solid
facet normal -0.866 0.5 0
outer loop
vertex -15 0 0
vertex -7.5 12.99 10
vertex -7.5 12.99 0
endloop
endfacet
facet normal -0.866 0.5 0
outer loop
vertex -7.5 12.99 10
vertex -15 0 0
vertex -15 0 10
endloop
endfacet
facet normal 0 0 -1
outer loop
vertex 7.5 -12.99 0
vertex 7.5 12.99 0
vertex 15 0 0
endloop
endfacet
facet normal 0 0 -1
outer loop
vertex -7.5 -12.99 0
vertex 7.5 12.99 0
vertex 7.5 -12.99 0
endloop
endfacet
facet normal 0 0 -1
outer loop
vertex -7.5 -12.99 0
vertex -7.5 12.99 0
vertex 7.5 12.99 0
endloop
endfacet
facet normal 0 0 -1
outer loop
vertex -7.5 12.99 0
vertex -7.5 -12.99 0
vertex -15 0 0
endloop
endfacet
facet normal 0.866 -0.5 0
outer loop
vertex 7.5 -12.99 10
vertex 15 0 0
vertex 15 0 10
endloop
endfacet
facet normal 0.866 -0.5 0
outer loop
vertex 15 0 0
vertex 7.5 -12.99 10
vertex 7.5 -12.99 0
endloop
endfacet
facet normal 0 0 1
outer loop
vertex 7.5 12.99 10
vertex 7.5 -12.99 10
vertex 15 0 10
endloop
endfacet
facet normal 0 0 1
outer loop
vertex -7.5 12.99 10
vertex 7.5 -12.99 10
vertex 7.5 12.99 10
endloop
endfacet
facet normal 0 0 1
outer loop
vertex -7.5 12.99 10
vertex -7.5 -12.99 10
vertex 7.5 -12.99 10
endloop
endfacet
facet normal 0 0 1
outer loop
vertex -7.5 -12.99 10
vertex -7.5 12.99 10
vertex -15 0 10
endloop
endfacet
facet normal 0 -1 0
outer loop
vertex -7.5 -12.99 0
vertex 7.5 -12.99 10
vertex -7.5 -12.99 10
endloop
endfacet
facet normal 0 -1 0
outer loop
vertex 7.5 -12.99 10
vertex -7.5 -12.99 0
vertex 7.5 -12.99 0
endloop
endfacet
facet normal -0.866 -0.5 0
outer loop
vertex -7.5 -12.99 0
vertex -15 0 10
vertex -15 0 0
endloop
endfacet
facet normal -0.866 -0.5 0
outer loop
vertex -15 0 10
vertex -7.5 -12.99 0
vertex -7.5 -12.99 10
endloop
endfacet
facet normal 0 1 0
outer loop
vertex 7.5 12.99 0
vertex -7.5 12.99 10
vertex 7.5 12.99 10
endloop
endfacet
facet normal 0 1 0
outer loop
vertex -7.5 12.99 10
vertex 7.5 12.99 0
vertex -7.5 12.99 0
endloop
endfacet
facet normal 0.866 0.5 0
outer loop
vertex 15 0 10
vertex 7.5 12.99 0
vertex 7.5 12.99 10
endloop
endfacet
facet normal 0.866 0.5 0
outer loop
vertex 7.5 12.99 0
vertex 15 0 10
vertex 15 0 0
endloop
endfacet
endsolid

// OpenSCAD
module hexagon() {
    polygon(points=[[15,0],[7.5,12.99],[-7.5,12.99],[-15,0],[-7.5,-12.99],[7.5,-12.99]]);
}

module circle_at_origin(radius) {
    circle(r=radius);
}

difference() {
    linear_extrude(height=10) {
        hexagon();
    }
    translate([0, 0, -1]) {
        circle_at_origin(7);
    }
}
